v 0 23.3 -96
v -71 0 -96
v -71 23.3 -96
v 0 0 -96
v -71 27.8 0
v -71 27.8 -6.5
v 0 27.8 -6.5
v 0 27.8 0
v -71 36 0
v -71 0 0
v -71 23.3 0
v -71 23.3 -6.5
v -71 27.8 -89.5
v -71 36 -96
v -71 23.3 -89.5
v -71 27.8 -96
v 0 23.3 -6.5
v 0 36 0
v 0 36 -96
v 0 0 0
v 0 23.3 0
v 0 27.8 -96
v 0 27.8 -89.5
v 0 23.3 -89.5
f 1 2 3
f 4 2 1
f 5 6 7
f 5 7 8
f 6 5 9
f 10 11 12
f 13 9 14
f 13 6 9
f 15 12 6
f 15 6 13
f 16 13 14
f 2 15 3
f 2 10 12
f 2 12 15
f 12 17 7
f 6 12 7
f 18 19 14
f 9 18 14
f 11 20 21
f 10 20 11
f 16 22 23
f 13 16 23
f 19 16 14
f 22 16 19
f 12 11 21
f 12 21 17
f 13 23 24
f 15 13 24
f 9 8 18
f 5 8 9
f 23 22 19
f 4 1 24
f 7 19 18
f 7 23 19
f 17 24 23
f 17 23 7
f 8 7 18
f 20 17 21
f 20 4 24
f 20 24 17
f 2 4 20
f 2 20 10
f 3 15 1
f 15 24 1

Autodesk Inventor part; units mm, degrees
ref_plane "YZ Plane" through (0, 0, 0) normal (1, 0, 0) x (0, 1, 0)
ref_plane "XZ Plane" through (0, 0, 0) normal (0, 1, 0) x (-1, 0, 0)
ref_plane "XY Plane" through (0, 0, 0) normal (0, 0, 1) x (1, 0, 0)
sketch "Sketch1" plane through (0, 0, 0) normal (0, 1, 0) x (-1, 0, 0)
  line L0 (0, 0) -> (71, 0)
  line L1 (71, 0) -> (71, -96)
  line L2 (71, -96) -> (0, -96)
  line L3 (0, -96) -> (0, 0)
  dimension "d0" = 96
  dimension "d1" = 71
extrude "Extrusion1" add sketch "Sketch1" along normal blind 36
sketch "Sketch2" plane through (0, 0, 0) normal (1, 0, 0) x (0, 0, -1)
  line L0 (96, 0) -> (0, 0) projected
  line L1 (0, 0) -> (0, 23.3)
  line L2 (0, 0) -> (0, 36) projected
  line L3 (96, 0) -> (96, 36) projected
  line L4 (0, 23.3) -> (96, 23.3)
  line L5 (96, 23.3) -> (96, 27.8)
  line L6 (96, 27.8) -> (0, 27.8)
  line L7 (0, 27.8) -> (0, 23.3)
  line L8 (6.5, 27.8) -> (89.5, 27.8)
  line L9 (89.5, 27.8) -> (89.5, 23.3)
  line L10 (89.5, 23.3) -> (6.5, 23.3)
  line L11 (6.5, 23.3) -> (6.5, 27.8)
  point P0 (6.5, 23.3)
  point P1 (0, 27.8)
  dimension "d4" = 23.3
  dimension "d5" = 4.5
  dimension "d6" = 83
  dimension "d7" = 6.5
extrude "Extrusion2" cut sketch "Sketch2" against normal blind 112.75 contours L4 L9 L6 L3 | L2 L6 L11 L4
properties part number "Placeholde_stepperdriverr"
